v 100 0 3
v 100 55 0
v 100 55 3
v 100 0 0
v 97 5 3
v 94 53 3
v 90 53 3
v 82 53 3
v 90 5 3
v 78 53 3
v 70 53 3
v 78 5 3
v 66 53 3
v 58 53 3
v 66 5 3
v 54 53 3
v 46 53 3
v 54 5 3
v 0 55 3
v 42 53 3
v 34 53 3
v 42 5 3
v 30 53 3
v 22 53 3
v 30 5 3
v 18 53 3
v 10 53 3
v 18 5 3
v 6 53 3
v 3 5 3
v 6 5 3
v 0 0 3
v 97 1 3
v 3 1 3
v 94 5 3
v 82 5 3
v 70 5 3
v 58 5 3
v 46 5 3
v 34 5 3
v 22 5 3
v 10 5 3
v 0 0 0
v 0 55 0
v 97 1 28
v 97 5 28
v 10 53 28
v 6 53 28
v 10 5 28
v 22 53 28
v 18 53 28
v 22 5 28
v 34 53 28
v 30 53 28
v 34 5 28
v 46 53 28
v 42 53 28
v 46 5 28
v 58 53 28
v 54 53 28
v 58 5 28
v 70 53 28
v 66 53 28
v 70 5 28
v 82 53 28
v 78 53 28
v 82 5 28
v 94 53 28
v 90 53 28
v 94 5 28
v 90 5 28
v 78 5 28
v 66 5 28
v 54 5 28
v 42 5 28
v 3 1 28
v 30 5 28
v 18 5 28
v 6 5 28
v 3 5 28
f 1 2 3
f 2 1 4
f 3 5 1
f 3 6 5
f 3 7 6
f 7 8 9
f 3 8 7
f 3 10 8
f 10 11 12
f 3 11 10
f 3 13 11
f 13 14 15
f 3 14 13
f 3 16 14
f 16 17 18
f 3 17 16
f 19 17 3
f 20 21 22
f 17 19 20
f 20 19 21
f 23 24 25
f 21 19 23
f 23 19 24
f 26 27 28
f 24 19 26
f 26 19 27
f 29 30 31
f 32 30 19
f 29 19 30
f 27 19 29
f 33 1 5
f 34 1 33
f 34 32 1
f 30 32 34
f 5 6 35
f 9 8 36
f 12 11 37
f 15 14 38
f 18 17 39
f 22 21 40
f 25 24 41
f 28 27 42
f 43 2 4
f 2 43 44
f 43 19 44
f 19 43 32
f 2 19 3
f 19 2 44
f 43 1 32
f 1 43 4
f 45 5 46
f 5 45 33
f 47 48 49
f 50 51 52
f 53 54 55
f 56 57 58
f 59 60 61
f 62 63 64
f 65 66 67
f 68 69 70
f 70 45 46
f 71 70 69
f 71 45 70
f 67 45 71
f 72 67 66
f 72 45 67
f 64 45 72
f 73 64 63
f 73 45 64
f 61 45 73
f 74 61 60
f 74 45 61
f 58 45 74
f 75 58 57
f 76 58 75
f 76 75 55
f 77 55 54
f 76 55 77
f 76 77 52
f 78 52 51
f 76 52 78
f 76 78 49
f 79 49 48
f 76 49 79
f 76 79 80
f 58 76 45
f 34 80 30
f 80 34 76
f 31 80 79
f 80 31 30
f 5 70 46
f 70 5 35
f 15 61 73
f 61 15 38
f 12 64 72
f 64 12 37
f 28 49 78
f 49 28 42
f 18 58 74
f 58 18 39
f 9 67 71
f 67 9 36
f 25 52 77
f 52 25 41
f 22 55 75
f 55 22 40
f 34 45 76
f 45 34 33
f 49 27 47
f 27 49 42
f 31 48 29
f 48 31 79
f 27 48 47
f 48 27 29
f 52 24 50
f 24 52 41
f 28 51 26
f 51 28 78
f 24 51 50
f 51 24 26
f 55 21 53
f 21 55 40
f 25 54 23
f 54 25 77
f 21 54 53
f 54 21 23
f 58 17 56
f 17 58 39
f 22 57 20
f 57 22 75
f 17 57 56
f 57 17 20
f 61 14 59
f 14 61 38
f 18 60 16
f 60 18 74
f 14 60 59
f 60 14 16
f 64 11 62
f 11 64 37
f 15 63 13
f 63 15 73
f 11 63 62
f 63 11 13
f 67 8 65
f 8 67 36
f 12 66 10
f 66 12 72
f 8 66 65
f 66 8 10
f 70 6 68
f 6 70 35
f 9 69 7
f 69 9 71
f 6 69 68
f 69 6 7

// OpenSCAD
union() {
	translate(v = [50.0, 27.5, 1.5]) {
		cube(center = true, size = [100.0, 55.0, 3.0]);
	}
	translate(v = [50.0, 3.0, 15.5]) {
		cube(center = true, size = [94.0, 4.0, 25.0]);
	}
	translate(v = [8.0, 28.0, 15.5]) {
		cube(center = true, size = [4.0, 50.0, 25.0]);
	}
	translate(v = [20.0, 28.0, 15.5]) {
		cube(center = true, size = [4.0, 50.0, 25.0]);
	}
	translate(v = [32.0, 28.0, 15.5]) {
		cube(center = true, size = [4.0, 50.0, 25.0]);
	}
	translate(v = [44.0, 28.0, 15.5]) {
		cube(center = true, size = [4.0, 50.0, 25.0]);
	}
	translate(v = [56.0, 28.0, 15.5]) {
		cube(center = true, size = [4.0, 50.0, 25.0]);
	}
	translate(v = [68.0, 28.0, 15.5]) {
		cube(center = true, size = [4.0, 50.0, 25.0]);
	}
	translate(v = [80.0, 28.0, 15.5]) {
		cube(center = true, size = [4.0, 50.0, 25.0]);
	}
	translate(v = [92.0, 28.0, 15.5]) {
		cube(center = true, size = [4.0, 50.0, 25.0]);
	}
}
